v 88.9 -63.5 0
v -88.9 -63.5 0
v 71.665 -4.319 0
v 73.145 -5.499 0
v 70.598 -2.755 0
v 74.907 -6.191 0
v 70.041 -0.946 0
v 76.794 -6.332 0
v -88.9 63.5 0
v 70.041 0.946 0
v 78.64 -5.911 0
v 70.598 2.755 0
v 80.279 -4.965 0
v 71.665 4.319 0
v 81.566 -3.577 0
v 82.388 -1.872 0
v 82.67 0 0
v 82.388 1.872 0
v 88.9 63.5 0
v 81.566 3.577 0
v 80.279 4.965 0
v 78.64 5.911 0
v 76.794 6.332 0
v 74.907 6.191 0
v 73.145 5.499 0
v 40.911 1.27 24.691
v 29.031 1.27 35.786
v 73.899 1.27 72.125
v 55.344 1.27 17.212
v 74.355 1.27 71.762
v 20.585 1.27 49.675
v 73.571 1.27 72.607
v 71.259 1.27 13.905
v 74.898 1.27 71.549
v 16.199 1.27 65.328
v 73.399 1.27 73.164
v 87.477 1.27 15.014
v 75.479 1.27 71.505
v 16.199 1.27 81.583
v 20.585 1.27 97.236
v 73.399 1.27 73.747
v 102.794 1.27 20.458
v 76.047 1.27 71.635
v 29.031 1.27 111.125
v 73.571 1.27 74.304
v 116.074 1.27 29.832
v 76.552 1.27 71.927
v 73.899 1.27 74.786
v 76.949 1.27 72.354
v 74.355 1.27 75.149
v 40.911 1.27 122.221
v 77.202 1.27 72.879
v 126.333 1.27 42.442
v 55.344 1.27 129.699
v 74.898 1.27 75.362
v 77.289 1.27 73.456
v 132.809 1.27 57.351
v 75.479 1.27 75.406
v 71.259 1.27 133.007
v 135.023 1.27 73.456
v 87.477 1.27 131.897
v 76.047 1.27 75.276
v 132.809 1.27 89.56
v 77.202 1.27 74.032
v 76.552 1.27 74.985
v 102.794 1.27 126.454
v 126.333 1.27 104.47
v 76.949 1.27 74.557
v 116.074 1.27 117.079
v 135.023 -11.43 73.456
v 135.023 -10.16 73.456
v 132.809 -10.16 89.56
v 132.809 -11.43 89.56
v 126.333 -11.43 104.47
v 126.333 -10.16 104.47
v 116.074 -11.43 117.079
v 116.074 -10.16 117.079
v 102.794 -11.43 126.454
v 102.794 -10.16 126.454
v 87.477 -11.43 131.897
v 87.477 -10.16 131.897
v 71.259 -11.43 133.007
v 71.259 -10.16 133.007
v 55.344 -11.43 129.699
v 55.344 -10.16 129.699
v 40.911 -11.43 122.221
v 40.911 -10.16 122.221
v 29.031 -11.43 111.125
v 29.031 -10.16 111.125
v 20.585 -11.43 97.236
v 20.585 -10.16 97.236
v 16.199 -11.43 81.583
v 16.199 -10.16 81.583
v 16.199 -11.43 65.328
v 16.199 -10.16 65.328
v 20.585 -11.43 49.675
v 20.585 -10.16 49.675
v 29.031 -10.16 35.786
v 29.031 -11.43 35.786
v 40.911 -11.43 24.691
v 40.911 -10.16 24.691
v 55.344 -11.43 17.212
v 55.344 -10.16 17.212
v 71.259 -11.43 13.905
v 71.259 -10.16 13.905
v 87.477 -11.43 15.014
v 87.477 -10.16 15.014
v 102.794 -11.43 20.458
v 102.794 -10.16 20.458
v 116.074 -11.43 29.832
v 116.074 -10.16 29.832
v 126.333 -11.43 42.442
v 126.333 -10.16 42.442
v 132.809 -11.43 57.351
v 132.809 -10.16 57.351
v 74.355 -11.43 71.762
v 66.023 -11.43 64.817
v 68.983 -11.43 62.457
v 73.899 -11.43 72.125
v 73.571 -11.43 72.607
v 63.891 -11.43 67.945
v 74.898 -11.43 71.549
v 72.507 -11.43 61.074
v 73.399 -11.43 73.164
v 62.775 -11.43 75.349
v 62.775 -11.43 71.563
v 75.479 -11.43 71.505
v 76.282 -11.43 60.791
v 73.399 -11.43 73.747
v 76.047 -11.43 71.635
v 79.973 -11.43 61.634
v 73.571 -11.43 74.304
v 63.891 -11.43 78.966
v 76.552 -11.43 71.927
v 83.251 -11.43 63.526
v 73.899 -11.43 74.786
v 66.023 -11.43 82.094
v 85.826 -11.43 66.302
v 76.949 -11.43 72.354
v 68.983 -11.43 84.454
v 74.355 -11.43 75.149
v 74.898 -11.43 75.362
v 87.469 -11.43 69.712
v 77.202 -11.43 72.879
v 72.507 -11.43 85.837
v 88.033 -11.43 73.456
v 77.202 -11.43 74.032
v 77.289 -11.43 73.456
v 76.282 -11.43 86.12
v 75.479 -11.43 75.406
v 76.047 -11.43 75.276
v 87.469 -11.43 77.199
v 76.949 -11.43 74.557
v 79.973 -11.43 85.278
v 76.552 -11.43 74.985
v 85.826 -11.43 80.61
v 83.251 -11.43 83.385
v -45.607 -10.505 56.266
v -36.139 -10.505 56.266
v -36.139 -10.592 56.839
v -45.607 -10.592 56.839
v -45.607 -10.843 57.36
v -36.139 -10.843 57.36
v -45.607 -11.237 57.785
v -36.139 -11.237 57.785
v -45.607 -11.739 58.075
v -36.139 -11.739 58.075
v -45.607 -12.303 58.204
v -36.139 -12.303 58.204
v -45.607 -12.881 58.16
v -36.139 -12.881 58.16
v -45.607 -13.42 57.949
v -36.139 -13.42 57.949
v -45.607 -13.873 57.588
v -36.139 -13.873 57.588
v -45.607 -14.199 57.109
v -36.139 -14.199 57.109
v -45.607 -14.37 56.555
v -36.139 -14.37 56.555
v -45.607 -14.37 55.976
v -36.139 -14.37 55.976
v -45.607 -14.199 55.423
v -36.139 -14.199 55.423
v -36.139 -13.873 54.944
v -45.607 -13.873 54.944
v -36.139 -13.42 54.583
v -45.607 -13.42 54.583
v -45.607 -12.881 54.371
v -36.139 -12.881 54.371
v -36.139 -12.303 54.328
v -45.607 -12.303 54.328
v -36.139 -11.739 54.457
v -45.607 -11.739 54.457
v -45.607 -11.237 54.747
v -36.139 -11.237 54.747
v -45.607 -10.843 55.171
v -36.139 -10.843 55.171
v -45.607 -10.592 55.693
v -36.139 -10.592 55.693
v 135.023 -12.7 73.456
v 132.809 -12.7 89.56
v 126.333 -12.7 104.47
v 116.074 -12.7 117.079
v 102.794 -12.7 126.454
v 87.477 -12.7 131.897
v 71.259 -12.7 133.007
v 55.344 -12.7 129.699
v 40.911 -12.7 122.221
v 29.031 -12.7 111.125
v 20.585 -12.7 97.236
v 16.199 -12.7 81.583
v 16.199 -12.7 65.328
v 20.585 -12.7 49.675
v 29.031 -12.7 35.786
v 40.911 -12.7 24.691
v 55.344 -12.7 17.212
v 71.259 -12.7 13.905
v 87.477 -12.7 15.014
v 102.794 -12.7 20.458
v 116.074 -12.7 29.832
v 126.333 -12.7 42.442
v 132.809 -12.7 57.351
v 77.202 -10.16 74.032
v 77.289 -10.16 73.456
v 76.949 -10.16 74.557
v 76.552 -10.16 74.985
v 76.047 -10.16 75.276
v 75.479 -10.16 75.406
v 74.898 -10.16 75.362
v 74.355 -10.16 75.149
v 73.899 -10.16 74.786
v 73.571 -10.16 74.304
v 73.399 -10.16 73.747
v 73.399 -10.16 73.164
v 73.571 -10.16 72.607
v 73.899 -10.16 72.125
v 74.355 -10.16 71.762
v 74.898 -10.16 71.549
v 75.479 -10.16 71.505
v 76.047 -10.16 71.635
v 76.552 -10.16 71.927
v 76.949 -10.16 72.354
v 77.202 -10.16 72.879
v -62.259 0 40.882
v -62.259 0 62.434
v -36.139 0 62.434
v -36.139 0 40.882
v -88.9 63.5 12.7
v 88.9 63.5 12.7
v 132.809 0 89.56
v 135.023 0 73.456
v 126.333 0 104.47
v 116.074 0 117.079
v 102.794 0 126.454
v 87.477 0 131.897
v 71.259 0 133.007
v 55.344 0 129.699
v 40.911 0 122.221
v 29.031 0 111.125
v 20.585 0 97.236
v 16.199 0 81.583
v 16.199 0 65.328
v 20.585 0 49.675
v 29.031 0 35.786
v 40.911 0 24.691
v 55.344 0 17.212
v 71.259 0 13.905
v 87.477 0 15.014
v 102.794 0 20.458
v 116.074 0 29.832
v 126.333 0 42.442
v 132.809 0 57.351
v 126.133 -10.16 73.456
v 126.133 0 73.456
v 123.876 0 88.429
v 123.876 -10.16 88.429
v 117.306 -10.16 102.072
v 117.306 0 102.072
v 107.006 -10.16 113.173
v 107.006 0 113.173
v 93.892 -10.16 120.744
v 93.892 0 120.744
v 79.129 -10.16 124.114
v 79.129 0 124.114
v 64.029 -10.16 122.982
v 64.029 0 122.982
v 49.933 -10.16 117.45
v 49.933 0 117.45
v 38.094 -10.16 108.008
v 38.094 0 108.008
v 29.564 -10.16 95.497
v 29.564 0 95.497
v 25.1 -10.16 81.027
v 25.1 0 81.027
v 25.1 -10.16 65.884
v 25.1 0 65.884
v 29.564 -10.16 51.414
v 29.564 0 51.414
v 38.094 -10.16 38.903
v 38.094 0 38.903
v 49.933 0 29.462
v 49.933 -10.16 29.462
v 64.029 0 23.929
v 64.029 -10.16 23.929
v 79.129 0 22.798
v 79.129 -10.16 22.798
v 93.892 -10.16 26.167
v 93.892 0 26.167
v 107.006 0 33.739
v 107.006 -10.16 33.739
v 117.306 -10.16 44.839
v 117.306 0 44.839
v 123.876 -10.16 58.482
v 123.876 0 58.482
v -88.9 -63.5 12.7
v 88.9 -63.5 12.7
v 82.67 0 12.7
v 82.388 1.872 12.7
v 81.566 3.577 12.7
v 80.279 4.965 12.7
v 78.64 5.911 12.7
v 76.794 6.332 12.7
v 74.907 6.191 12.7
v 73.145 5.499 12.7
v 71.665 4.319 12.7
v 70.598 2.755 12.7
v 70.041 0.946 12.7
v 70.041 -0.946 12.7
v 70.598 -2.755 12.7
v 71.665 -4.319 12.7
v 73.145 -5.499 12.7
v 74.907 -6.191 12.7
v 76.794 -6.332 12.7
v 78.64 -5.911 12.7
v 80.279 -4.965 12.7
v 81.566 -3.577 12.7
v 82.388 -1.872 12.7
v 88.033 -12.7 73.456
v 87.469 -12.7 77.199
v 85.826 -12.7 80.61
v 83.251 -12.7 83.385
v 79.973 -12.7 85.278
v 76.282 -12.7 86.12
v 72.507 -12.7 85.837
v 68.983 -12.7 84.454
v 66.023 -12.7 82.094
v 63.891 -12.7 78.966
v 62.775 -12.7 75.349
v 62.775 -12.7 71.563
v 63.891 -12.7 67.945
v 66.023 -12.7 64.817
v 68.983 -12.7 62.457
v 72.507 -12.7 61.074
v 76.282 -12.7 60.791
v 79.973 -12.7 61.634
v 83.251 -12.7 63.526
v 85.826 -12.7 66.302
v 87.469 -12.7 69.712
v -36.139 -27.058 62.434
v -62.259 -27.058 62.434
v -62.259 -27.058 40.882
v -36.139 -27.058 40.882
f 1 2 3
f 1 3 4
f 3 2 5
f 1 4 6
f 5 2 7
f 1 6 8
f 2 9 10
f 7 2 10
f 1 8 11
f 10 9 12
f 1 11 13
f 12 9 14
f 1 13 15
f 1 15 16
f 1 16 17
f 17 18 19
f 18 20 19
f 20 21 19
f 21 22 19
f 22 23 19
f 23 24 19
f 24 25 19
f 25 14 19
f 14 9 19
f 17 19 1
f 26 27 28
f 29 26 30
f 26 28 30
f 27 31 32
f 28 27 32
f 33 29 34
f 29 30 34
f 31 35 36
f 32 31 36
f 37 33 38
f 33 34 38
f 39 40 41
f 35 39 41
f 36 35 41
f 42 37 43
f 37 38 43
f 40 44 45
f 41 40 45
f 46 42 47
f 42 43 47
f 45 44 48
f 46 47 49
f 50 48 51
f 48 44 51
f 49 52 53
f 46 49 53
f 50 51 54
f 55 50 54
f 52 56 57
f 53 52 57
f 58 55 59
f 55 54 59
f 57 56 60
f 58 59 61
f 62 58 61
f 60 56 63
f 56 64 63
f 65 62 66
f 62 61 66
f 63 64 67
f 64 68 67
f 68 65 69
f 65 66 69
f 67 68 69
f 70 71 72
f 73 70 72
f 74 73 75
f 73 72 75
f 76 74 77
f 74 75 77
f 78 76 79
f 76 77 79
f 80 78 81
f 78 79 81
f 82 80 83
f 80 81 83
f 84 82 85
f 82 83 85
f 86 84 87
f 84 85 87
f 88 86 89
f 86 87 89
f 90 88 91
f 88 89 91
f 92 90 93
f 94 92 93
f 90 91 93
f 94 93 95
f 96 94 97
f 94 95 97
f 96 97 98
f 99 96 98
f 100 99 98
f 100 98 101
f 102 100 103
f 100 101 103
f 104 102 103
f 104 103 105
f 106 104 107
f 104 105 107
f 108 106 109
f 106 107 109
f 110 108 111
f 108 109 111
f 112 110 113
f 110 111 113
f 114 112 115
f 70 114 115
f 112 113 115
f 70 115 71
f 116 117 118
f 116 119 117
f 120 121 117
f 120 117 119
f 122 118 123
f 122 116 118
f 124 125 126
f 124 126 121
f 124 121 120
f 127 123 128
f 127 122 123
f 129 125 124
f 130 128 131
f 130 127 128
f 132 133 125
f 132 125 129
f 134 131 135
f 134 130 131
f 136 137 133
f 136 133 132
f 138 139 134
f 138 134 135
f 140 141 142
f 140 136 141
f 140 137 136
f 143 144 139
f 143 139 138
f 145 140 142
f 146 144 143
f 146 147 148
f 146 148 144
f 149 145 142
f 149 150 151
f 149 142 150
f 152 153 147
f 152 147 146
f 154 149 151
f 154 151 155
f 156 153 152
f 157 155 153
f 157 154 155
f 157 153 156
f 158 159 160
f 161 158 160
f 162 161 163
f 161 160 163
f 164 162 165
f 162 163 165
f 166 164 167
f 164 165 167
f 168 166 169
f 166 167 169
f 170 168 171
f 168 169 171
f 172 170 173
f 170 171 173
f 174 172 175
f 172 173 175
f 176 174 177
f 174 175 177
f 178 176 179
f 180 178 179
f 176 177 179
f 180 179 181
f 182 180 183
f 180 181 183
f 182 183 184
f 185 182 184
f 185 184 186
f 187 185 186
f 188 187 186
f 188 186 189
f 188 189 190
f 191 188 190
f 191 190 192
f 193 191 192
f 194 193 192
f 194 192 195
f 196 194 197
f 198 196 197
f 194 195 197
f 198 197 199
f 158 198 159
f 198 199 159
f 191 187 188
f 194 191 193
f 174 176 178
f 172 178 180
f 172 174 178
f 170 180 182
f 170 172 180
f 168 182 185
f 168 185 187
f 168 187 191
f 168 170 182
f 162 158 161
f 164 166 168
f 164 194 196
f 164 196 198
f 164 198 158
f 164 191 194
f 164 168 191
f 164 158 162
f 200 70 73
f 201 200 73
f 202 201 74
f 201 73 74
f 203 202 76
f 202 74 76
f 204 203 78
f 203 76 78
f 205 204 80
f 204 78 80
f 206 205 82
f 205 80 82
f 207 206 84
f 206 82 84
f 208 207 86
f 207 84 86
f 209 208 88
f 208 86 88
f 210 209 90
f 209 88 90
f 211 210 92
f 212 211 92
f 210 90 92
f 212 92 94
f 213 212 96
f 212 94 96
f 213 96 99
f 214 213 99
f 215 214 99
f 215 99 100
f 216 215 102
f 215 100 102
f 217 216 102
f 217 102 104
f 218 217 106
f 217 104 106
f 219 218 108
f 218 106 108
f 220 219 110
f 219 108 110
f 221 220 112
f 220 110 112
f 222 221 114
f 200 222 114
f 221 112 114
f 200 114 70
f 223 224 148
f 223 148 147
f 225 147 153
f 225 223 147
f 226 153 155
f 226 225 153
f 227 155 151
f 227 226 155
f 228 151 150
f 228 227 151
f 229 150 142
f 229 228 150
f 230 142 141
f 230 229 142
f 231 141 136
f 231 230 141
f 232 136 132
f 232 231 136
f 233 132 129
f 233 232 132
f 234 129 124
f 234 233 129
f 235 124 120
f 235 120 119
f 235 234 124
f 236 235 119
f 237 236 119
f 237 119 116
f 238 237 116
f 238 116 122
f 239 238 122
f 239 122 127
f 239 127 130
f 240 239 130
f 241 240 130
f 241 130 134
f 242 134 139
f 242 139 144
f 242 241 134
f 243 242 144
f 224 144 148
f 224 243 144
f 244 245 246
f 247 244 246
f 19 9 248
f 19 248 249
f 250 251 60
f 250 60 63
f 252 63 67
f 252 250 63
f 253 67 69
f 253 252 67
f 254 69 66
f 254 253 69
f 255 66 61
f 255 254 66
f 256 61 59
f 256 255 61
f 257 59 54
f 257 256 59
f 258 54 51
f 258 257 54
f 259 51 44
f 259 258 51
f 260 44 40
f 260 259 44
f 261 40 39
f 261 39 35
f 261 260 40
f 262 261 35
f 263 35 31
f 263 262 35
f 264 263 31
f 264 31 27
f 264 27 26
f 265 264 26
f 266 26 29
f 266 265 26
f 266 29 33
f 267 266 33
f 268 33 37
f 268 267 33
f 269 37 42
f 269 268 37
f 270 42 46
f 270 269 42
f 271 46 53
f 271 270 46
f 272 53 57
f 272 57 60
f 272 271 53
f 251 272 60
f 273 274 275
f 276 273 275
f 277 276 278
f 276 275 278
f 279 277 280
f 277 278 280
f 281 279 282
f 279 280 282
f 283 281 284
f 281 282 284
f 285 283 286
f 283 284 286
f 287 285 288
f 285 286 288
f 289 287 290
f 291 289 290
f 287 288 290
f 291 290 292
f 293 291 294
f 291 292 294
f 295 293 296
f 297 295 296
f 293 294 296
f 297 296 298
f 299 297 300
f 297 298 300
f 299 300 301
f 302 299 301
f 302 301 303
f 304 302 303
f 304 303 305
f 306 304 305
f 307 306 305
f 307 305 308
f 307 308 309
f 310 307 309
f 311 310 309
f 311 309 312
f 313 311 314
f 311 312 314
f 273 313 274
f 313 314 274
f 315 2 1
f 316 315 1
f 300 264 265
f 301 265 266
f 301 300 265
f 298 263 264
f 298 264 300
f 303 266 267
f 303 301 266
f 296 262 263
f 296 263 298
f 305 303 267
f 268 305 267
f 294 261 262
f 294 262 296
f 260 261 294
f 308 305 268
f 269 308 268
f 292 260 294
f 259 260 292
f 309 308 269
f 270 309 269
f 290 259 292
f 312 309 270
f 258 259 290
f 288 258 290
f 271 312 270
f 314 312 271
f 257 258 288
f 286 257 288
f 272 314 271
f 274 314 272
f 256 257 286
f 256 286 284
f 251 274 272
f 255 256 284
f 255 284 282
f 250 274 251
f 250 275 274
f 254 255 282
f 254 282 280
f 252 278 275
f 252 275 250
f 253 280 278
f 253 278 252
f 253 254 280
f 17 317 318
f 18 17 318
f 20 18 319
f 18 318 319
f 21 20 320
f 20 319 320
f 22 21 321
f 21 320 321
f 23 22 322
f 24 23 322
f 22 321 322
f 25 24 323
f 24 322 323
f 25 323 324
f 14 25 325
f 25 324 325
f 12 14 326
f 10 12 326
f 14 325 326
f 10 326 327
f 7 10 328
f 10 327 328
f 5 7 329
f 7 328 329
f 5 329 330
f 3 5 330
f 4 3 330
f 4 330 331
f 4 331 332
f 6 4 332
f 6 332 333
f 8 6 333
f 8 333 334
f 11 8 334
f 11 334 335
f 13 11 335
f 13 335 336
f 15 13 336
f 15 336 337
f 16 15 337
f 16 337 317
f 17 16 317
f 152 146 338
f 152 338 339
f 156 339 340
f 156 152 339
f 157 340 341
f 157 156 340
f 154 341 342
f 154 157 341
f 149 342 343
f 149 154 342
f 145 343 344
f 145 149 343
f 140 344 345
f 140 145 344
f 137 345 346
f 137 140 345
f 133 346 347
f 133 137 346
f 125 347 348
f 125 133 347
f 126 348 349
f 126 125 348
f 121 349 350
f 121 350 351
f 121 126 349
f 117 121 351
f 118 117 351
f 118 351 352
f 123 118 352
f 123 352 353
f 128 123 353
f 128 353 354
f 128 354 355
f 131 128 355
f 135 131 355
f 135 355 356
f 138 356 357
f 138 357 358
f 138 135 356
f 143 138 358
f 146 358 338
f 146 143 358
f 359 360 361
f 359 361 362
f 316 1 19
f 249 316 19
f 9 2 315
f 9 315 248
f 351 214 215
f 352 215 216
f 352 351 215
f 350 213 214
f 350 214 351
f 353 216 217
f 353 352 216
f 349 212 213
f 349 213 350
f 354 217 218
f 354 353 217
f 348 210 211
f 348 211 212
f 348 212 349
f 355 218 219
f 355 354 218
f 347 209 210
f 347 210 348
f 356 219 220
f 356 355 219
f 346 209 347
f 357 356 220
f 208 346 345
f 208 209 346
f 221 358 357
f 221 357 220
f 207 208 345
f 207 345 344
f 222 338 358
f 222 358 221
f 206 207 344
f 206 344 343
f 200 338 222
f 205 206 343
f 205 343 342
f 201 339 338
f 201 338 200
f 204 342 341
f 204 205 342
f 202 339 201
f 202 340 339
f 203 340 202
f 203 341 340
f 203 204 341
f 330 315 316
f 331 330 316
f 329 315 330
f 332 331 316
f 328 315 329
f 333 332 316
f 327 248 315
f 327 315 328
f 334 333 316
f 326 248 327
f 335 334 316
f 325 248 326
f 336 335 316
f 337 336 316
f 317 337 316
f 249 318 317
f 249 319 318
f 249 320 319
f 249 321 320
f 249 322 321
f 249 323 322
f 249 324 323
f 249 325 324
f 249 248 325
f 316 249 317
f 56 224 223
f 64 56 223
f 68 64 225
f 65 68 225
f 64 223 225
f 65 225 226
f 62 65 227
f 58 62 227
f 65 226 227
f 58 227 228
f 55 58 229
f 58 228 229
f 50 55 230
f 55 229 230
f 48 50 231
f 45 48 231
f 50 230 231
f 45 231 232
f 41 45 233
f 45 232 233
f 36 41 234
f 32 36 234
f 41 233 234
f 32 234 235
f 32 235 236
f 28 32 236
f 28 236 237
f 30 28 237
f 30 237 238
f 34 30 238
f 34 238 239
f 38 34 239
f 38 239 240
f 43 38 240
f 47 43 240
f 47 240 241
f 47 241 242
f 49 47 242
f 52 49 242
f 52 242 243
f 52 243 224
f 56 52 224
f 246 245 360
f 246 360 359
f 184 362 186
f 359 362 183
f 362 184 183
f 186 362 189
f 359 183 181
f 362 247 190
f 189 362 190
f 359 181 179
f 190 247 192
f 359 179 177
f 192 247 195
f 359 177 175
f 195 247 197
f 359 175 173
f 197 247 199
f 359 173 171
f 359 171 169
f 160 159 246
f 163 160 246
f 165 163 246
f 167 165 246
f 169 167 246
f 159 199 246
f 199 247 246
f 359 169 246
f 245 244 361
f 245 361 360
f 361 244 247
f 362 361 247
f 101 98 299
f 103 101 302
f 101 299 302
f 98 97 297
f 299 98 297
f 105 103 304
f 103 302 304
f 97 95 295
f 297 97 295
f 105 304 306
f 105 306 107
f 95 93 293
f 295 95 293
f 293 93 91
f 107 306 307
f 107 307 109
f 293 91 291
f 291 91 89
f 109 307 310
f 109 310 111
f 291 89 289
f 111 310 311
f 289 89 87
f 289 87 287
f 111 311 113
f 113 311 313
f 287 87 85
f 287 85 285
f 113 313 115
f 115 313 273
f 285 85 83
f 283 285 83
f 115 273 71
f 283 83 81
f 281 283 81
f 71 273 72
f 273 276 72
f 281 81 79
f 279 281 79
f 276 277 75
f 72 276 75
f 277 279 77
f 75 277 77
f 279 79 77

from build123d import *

# Parameters (mm, degrees)
F0_W           = 177.8
F0_H           = 127
F1_DEPTH       = 12.7
F2_W           = 26.1195935309
F2_H           = 21.5520188212
F3_DEPTH       = 27.05832
F4_R           = 1.9431
F5_DEPTH       = 9.46796
F6_R           = 50.8
F7_DEPTH       = 10.16
F6_R_2         = 59.69
F8_DEPTH       = 1.27
F9_R           = 1.9558
F10_DEPTH      = 25.4
F10_DEPTH_BACK = 75.06569
F9_R_2         = 59.69
F9_R_3         = 50.8
F9_R_4         = 12.7
F11_DEPTH      = 1.27
F11_FACE_R     = 59.69
F11_FACE_R_2   = 12.7
F12_DEPTH      = 1.27
F13_R          = 6.35
F14_DEPTH      = 25.4


# Not quite as in the source:
# - a length typed as a fraction of an inch, garbled in the dataset ("3 / 203.2 mm" for 3/8 in), is restored


with BuildPart() as f1:
    # F0 (on Top) → F1 (new body)
    with BuildSketch(Plane.XY):
        Rectangle(F0_W, F0_H)
    extrude(amount=F1_DEPTH)

    # F13 (on face) → F14 (cut)
    with BuildSketch(Plane.XY.offset(12.7)):
        with Locations((76.3196462645, 0)):
            Circle(F13_R)
    extrude(amount=-F14_DEPTH, mode=Mode.SUBTRACT)


with BuildPart() as f3:
    # F2 (on Front) → F3 (new body)
    with BuildSketch(Plane.XZ):
        with Locations((-49.19908382, 51.6582764685)):
            Rectangle(F2_W, F2_H)
    extrude(amount=F3_DEPTH)

    # F4 (on face) → F5 (cut)
    with BuildSketch(Plane.YZ.offset(-36.1392870545)):
        with Locations((-12.4484756961, 56.265860796)):
            Circle(F4_R)
    extrude(amount=-F5_DEPTH, mode=Mode.SUBTRACT)


with BuildPart() as f7:
    # F6 (on Front) → F7 (new body)
    with BuildSketch(Plane.XZ):
        with Locations((75.3328502178, 73.4556689858)):
            Circle(F6_R)
    extrude(amount=F7_DEPTH)

    # F6 (on Front) → F8 (join)
    with BuildSketch(Plane.XZ):
        with Locations((75.3328502178, 73.4556689858)):
            Circle(F6_R_2)
        with Locations((75.3328502178, 73.4556689858)):
            Circle(F6_R, mode=Mode.SUBTRACT)
        with Locations((75.3328502178, 73.4556689858)):
            Circle(F6_R)
    extrude(amount=-F8_DEPTH)

    # F9 (on face) → F10 (cut, two sides)
    with BuildSketch(Plane.XZ.offset(10.16)) as f10_sk:
        with Locations((75.3328502178, 73.4556689858)):
            Circle(F9_R)
    extrude(amount=-F10_DEPTH, mode=Mode.SUBTRACT)
    extrude(f10_sk.sketch, amount=F10_DEPTH_BACK, mode=Mode.SUBTRACT)

    # F9 (on face) → F11 (join)
    with BuildSketch(Plane.XZ.offset(10.16)):
        with Locations((75.3328502178, 73.4556689858)):
            Circle(F9_R_2)
        with Locations((75.3328502178, 73.4556689858)):
            Circle(F9_R_3, mode=Mode.SUBTRACT)
        with Locations((75.3328502178, 73.4556689858)):
            Circle(F9_R_3)
        with Locations((75.3328502178, 73.4556689858)):
            Circle(F9_R_4, mode=Mode.SUBTRACT)
    extrude(amount=F11_DEPTH)

    # F9 (on face) + F11_face (on face) → F12 (join)
    with BuildSketch(Plane.XZ.offset(10.16)):
        with Locations((75.3328502178, 73.4556689858)):
            Circle(F9_R_4)
        with Locations((75.3328502178, 73.4556689858)):
            Circle(F9_R, mode=Mode.SUBTRACT)
    with BuildSketch(Plane(origin=(75.3328502178, -11.43, 73.4556689858), x_dir=(1, 0, 0), z_dir=(0, -1, 0))):
        Circle(F11_FACE_R)
        Circle(F11_FACE_R_2, mode=Mode.SUBTRACT)
    extrude(amount=F12_DEPTH)


solid = Compound([f1.part, f3.part, f7.part])
